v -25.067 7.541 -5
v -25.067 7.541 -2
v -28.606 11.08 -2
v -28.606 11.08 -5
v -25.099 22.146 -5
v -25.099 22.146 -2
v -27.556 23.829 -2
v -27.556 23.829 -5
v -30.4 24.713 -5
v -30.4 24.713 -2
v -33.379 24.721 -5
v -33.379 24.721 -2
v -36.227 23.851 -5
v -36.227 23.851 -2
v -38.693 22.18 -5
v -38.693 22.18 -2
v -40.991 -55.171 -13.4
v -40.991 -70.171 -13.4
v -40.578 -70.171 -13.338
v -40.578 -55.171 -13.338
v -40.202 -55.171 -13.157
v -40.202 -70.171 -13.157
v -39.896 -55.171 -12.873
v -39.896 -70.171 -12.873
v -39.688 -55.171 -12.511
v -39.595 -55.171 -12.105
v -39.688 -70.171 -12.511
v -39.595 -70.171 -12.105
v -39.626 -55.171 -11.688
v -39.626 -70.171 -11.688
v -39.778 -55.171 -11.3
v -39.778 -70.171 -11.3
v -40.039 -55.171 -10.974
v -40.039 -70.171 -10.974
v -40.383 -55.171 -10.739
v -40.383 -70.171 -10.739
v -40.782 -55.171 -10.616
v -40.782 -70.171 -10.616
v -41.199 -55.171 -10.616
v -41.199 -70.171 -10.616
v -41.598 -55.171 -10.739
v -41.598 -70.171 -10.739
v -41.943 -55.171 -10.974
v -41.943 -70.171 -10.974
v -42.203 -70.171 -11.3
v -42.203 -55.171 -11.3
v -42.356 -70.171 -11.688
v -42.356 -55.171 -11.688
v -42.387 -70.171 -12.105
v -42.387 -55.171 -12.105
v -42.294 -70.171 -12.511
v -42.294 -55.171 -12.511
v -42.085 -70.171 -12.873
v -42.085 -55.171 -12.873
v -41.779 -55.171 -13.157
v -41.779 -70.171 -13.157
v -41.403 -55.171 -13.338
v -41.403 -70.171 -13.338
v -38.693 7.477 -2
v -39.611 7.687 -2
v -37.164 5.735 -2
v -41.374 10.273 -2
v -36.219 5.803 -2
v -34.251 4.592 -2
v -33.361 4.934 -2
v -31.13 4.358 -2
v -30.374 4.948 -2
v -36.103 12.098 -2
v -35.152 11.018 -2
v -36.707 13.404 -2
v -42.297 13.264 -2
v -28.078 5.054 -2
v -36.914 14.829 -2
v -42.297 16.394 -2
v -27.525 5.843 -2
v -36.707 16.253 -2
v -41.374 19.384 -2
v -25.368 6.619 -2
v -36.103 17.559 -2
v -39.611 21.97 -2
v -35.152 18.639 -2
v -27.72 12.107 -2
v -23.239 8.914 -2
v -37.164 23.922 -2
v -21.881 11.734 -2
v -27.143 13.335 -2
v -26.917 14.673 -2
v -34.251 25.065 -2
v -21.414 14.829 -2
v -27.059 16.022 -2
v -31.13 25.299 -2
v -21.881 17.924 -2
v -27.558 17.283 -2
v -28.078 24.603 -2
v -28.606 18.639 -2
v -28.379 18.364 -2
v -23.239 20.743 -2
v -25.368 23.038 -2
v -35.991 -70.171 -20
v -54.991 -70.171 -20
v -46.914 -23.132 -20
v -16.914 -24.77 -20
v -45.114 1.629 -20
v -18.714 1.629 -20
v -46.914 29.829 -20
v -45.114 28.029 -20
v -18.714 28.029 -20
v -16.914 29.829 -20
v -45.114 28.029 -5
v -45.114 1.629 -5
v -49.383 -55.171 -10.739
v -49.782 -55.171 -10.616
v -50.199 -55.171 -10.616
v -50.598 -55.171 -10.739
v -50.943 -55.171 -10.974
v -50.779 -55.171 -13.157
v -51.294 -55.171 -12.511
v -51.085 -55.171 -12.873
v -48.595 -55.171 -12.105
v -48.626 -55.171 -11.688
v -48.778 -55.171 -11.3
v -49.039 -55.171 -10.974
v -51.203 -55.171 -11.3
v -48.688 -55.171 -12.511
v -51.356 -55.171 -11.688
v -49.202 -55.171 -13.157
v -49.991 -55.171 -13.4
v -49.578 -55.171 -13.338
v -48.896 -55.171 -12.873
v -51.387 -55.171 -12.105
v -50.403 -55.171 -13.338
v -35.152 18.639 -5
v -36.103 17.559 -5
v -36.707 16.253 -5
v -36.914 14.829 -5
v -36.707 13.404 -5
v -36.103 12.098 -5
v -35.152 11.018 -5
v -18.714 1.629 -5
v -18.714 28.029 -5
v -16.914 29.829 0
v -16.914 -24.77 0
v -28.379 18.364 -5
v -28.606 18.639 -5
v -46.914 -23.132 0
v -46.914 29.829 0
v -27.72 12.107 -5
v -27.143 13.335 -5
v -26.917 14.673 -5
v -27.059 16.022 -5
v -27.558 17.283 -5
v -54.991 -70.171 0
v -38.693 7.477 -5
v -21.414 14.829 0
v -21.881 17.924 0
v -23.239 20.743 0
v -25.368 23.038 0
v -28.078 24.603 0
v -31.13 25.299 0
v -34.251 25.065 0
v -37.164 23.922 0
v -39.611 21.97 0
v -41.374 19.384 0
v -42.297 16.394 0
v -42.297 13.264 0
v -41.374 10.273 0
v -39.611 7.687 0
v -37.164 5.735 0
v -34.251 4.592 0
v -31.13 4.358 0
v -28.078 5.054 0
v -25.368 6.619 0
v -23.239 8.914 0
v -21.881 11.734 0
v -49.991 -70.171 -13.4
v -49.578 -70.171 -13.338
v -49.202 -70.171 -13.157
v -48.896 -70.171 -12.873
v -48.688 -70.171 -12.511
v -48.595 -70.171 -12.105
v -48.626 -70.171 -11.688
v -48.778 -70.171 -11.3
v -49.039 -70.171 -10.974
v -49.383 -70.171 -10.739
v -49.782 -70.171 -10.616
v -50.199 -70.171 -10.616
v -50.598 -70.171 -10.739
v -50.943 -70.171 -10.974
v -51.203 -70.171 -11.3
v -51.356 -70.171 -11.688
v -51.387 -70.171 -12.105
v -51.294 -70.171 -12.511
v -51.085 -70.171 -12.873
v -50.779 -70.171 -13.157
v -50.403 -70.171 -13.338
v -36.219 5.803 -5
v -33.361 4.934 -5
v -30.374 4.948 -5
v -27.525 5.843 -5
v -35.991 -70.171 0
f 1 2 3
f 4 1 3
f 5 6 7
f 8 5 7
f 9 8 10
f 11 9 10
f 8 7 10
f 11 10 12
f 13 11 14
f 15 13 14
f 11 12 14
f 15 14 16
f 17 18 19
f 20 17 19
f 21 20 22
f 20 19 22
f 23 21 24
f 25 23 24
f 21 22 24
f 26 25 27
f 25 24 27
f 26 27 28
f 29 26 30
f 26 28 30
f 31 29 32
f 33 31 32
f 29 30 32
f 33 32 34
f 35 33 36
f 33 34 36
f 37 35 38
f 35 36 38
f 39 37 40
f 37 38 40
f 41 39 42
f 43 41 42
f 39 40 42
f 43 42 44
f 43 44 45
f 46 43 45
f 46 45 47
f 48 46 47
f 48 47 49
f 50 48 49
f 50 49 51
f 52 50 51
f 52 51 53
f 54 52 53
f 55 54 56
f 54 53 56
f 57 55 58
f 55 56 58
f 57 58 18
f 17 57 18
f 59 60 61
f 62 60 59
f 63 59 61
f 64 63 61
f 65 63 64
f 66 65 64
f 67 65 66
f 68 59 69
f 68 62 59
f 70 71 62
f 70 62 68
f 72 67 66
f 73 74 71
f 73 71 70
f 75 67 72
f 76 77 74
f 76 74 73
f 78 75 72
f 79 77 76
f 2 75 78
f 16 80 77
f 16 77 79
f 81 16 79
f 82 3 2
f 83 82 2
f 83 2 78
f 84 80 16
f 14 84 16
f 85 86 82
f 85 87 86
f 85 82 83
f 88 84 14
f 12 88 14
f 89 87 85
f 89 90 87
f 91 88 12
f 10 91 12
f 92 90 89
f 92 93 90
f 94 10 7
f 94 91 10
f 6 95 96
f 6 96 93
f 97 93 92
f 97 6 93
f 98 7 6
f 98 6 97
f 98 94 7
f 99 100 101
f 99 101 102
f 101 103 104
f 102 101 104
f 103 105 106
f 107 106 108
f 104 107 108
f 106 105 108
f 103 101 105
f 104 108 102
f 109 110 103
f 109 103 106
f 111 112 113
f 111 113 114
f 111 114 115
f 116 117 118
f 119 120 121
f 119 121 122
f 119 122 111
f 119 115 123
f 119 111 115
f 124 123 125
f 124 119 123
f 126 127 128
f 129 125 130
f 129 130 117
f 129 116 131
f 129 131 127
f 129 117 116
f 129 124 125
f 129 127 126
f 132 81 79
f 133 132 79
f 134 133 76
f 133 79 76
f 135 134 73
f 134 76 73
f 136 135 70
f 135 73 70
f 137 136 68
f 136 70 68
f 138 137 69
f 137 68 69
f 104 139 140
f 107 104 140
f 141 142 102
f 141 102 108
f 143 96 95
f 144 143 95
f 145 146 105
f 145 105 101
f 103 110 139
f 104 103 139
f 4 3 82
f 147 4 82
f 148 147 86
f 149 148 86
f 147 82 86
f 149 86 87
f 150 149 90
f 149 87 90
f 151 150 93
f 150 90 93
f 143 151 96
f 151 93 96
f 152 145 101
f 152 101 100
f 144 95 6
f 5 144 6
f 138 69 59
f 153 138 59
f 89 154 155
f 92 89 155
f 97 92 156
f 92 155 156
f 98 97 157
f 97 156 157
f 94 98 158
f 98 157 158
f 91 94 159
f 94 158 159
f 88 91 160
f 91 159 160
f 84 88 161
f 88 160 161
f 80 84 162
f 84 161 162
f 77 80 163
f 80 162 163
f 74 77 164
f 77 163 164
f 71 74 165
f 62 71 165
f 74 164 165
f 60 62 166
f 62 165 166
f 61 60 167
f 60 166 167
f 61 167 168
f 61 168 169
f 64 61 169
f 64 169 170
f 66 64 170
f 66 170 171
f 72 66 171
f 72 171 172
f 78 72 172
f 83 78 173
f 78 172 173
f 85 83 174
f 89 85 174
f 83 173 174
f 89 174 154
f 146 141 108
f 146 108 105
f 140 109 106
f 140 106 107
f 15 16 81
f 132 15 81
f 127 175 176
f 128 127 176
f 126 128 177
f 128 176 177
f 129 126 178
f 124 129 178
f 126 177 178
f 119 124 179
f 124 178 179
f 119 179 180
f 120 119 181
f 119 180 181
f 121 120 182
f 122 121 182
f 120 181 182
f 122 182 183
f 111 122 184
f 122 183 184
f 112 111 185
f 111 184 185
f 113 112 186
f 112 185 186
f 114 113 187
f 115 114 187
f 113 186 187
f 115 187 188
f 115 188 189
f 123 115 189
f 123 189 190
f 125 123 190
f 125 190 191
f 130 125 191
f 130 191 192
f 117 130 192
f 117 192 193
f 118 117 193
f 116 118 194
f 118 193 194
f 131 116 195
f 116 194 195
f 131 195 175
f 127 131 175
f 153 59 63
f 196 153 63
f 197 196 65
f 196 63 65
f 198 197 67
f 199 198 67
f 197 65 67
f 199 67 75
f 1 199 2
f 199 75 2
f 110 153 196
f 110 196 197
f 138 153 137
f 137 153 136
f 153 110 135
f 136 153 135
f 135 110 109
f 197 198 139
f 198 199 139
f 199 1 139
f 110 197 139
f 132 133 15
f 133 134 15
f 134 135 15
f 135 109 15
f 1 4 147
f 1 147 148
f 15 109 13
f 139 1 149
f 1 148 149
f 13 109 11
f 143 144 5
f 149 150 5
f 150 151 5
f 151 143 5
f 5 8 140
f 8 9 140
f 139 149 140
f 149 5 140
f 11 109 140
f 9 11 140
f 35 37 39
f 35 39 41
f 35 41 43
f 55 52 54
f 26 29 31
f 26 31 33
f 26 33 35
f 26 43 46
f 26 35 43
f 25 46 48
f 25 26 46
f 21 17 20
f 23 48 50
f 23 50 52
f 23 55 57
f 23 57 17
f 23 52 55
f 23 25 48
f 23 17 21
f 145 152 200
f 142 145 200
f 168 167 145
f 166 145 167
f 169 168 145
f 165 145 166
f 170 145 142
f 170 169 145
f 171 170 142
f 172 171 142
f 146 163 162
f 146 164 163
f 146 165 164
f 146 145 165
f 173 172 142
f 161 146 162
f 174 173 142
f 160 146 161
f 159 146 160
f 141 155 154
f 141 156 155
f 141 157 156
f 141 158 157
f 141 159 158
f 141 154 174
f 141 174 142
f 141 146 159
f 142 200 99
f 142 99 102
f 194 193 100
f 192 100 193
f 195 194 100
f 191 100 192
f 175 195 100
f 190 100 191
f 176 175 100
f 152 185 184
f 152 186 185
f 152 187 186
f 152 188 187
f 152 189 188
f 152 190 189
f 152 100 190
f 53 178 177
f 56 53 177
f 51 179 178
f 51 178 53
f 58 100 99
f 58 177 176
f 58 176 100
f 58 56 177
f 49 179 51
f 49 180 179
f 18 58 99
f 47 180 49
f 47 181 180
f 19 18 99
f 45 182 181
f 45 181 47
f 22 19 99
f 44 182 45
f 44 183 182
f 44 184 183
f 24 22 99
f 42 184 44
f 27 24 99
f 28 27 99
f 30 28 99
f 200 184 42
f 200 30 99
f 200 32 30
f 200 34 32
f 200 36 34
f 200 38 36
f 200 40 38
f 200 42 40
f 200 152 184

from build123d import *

# Parameters (mm, degrees)
SKETCH1_25_W        = 26.4
SKETCH1_25_H        = 26.4
BOSS_EXTRUDE8_DEPTH = 20
SKETCH1_27_W        = 26.4
SKETCH1_27_H        = 26.4
BOSS_EXTRUDE9_DEPTH = 5
SKETCH1_R           = 10.5
CUT_EXTRUDE3_DEPTH  = 2
SKETCH4_R           = 1.4
CUT_EXTRUDE4_DEPTH  = 15


with BuildPart() as part:
    # Sketch1<25> → Boss-Extrude8 (new body)
    with BuildSketch(Plane.XY):
        Polygon((-46.914285714, 29.828571429), (-46.914285714, -1.887541502), (-46.914285714, -23.131847808), (-54.990816107, -70.171428571), (-35.990816107, -70.171428571), (-16.914285714, -24.770069728), (-16.914285714, -1.887541502), (-16.914285714, 29.828571429), align=None)
        with Locations((-31.914285714, 14.828571429)):
            Rectangle(SKETCH1_25_W, SKETCH1_25_H, mode=Mode.SUBTRACT)
    extrude(amount=-BOSS_EXTRUDE8_DEPTH)

    # Sketch1<27> → Boss-Extrude9 (add)
    with BuildSketch(Plane.XY):
        with Locations((-31.914285714, 14.828571429)):
            Rectangle(SKETCH1_27_W, SKETCH1_27_H)
        with BuildLine():
            Line((-28.605725915, 18.638938958), (-25.098574601, 22.146090272))
            ThreePointArc((-25.098574601, 22.146090272), (-31.889127352, 24.828539781), (-38.693091307, 22.180291958))
            Line((-38.693091307, 22.180291958), (-35.151738307, 18.638938958))
            ThreePointArc((-35.151738307, 18.638938958), (-36.914285714, 14.828571429), (-35.151738307, 11.018203899))
            Line((-35.151738307, 11.018203899), (-38.693091307, 7.4768509))
            ThreePointArc((-38.693091307, 7.4768509), (-31.867344715, 4.828681602), (-25.066760197, 7.540814964))
            Line((-25.066760197, 7.540814964), (-28.605725915, 11.079780683))
            ThreePointArc((-28.605725915, 11.079780683), (-26.916711196, 14.672850745), (-28.378751808, 18.364105335))
            Line((-28.378751808, 18.364105335), (-28.605725915, 18.638938958))
        make_face(mode=Mode.SUBTRACT)
    extrude(amount=-BOSS_EXTRUDE9_DEPTH)

    # Sketch1 → Cut-Extrude3 (cut)
    with BuildSketch(Plane.XY):
        with Locations((-31.914285714, 14.828571429)):
            Circle(SKETCH1_R)
    extrude(amount=-CUT_EXTRUDE3_DEPTH, mode=Mode.SUBTRACT)

    # Sketch4 → Cut-Extrude4 (cut)
    with BuildSketch(Plane(origin=(0, -70.171428571, 0), x_dir=(-1, 0, 0), z_dir=(0, -1, 0))):
        with Locations((40.990816107, 12)):
            Circle(SKETCH4_R)
        with Locations((49.990816107, 12)):
            Circle(SKETCH4_R)
    extrude(amount=-CUT_EXTRUDE4_DEPTH, mode=Mode.SUBTRACT)


solid = part.part
